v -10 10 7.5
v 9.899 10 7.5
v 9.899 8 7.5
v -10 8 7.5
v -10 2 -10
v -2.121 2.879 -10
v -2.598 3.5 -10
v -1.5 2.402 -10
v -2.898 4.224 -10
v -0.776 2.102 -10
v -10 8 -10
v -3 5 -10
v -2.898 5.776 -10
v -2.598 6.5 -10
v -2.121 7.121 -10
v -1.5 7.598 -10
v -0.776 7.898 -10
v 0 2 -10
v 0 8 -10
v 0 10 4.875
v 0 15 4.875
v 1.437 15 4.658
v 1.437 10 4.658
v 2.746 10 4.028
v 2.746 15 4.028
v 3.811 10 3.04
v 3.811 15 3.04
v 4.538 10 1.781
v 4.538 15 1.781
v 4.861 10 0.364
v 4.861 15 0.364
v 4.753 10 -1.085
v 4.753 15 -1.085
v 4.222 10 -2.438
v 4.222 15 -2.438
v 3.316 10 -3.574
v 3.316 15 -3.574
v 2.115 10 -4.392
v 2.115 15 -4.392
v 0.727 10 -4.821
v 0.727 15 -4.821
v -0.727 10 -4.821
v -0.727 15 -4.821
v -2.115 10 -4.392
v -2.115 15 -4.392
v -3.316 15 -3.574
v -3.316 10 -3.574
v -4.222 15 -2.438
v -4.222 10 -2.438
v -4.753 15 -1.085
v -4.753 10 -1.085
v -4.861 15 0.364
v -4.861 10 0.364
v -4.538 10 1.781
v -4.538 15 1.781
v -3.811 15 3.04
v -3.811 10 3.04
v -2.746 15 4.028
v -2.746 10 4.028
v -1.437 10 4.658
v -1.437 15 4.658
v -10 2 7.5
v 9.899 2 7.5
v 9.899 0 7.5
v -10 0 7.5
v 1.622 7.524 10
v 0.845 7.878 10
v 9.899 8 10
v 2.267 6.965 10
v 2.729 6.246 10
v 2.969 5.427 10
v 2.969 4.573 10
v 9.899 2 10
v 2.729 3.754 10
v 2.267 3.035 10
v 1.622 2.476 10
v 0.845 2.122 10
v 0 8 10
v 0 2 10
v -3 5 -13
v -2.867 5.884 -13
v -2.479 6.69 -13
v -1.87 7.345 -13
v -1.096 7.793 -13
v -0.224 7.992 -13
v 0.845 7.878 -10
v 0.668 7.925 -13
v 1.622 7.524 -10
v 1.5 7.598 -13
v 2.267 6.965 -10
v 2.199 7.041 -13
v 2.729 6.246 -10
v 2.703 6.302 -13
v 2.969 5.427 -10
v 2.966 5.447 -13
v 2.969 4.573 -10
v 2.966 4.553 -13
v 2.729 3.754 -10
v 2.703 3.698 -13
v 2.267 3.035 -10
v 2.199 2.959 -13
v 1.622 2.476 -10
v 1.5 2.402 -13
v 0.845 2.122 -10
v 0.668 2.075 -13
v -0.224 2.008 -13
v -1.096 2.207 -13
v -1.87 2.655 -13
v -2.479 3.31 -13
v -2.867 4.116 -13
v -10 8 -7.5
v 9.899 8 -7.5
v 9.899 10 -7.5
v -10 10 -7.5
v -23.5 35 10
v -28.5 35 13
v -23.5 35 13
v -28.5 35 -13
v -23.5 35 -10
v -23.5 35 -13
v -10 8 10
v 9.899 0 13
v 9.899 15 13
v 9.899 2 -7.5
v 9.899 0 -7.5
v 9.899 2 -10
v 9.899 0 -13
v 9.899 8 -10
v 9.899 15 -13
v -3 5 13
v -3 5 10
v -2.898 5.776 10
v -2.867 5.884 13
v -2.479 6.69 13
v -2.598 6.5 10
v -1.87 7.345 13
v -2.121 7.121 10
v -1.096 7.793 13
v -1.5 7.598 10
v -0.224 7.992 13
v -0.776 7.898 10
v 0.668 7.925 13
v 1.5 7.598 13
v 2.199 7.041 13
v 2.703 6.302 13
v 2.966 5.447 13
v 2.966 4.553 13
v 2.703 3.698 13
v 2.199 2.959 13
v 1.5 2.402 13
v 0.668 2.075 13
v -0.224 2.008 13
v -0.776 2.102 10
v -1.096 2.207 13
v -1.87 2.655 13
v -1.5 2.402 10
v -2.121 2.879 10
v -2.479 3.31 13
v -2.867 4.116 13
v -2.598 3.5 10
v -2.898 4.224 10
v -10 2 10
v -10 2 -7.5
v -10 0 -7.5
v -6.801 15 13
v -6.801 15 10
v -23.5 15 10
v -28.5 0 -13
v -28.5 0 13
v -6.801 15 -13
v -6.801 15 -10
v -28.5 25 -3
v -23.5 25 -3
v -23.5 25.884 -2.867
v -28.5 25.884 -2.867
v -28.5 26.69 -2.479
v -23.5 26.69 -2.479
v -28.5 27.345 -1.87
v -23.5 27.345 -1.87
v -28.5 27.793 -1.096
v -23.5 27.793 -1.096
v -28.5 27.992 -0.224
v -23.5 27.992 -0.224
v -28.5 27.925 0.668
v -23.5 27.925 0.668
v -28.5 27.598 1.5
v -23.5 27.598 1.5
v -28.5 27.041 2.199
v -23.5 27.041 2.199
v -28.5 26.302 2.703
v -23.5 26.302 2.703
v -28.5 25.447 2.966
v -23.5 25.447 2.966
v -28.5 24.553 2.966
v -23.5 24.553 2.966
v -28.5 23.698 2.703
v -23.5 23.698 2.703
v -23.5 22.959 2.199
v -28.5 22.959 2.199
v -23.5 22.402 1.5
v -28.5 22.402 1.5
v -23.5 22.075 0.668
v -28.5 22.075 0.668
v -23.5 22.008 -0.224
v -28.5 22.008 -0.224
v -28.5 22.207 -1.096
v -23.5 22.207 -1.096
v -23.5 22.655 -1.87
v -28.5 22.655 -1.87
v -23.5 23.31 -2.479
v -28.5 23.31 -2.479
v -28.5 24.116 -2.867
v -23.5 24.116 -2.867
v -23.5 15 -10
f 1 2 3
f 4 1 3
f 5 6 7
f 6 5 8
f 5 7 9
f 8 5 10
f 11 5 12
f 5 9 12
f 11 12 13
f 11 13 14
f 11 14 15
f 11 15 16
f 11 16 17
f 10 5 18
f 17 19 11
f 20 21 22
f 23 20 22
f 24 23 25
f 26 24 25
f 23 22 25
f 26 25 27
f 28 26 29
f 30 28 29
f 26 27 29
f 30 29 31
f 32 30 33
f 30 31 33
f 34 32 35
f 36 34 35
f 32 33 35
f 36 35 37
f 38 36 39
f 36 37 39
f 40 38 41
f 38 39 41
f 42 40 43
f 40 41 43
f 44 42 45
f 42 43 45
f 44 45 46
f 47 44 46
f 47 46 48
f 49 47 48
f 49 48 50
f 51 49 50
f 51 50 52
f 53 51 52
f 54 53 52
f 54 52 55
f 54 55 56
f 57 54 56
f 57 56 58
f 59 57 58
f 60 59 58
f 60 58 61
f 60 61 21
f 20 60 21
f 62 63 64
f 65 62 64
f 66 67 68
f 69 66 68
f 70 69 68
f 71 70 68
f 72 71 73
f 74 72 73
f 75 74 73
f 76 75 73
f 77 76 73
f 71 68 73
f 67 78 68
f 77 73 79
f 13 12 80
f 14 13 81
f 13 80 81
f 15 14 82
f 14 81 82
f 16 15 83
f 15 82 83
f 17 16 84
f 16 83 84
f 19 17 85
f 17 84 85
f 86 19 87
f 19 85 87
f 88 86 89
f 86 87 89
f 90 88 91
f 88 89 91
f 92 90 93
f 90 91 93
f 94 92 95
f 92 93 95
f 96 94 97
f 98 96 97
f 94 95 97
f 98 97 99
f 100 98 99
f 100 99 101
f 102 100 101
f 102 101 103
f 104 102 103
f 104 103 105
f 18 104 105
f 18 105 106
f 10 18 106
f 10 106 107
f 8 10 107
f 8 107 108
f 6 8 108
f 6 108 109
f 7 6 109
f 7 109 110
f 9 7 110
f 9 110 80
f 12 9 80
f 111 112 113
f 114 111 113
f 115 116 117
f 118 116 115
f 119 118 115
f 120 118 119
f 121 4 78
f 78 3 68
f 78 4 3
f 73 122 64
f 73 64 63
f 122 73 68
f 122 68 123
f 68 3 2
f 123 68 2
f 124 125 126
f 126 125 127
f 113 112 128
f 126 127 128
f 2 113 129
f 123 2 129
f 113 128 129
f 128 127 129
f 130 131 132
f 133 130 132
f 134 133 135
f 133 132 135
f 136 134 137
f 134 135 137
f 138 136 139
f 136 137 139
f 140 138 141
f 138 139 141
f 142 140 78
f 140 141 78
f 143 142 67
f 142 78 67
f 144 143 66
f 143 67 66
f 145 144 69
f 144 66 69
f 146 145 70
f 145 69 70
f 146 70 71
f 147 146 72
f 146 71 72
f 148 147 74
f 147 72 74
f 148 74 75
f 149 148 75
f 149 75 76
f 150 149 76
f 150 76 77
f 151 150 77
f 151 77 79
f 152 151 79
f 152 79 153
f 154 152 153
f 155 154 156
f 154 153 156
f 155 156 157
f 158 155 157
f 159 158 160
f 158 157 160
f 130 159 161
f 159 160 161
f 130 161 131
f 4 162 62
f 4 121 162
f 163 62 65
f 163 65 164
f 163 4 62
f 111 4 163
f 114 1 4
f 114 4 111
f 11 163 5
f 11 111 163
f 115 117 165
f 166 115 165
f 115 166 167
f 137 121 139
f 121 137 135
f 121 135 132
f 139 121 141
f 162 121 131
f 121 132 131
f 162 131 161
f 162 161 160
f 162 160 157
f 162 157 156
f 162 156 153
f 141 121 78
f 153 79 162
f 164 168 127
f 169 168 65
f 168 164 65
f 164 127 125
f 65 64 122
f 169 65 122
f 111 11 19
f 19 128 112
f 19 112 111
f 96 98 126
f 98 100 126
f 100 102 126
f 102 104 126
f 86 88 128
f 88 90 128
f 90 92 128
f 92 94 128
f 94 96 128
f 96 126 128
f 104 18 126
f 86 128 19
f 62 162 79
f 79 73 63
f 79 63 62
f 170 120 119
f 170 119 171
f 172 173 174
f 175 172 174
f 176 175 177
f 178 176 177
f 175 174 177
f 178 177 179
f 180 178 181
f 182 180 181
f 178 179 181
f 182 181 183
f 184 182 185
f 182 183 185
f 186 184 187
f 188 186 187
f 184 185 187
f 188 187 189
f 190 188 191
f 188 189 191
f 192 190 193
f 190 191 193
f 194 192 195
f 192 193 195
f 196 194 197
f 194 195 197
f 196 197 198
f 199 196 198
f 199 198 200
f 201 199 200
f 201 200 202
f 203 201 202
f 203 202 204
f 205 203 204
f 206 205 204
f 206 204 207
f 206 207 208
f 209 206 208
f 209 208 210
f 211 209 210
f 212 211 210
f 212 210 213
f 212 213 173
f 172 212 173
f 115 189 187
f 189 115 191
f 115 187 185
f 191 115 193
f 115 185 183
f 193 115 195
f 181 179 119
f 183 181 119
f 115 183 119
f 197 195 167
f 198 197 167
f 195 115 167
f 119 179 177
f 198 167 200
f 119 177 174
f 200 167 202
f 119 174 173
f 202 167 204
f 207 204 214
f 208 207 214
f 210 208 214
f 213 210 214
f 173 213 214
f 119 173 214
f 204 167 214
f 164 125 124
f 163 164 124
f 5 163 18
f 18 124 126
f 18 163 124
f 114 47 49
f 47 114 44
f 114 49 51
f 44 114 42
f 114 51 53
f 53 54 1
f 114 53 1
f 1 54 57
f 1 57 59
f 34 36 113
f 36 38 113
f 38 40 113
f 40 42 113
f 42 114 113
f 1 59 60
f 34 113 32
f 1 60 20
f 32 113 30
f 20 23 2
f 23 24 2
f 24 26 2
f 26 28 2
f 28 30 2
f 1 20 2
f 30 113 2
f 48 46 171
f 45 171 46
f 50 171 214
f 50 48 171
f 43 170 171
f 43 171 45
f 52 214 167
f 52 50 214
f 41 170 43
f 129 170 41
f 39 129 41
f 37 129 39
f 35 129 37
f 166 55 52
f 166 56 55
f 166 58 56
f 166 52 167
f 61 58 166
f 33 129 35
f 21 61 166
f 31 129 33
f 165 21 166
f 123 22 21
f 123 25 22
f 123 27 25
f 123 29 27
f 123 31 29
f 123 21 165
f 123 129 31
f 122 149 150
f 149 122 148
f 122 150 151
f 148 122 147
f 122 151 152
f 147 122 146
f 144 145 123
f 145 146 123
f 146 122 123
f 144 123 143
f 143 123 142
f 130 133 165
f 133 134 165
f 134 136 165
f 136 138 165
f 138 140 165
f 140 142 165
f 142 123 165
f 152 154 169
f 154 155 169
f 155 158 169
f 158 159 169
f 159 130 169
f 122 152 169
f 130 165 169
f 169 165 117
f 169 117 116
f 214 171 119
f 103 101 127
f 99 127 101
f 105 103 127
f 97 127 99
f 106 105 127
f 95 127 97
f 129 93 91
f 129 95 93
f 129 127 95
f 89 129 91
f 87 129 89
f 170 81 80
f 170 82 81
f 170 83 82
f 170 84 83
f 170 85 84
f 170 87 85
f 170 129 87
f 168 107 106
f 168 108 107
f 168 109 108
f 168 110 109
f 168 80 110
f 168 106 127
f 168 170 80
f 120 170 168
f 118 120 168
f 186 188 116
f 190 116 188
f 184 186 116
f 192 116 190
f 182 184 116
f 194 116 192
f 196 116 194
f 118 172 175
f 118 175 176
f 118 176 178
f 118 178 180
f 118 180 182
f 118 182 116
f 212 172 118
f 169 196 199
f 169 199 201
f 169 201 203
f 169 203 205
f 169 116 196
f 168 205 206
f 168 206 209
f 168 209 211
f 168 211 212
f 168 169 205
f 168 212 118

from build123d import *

# Parameters (mm, degrees)
SKETCH1_W           = 27
SKETCH1_H           = 26
BOSS_EXTRUDE1_DEPTH = 15
CUT_EXTRUDE2_DEPTH  = 23.5
SKETCH5_W           = 3.601284645
SKETCH5_H           = 15
CUT_EXTRUDE3_DEPTH  = 33.912763482
SKETCH6_R           = 3
CUT_EXTRUDE4_DEPTH  = 33.912763482
SKETCH11_R          = 4.875
CUT_EXTRUDE6_DEPTH  = 25.005207768
SKETCH13_W          = 26
SKETCH13_H          = 15
BOSS_EXTRUDE3_DEPTH = 15
SKETCH14_W          = 5
SKETCH14_H          = 26
BOSS_EXTRUDE4_DEPTH = 20
SKETCH15_R          = 3
CUT_EXTRUDE7_DEPTH  = 20
BOSS_EXTRUDE5_DEPTH = 3
BOSS_EXTRUDE6_DEPTH = 3


with BuildPart() as part:
    # Sketch1 → Boss-Extrude1 (new body)
    with BuildSketch(Plane(origin=(0, 0, 0), x_dir=(1, 0, 0), z_dir=(0, 1, 0))):
        Rectangle(SKETCH1_W, SKETCH1_H)
    extrude(amount=BOSS_EXTRUDE1_DEPTH)

    # Sketch4 → Cut-Extrude2 (cut)
    with BuildSketch(Plane(origin=(13.5, 0, 0), x_dir=(0, 0, -1), z_dir=(1, 0, 0))):
        Polygon((-10, 2), (-7.5, 2), (-7.5, 0), (7.5, 0), (7.5, 2), (10, 2), (10, 8), (7.5, 8), (7.5, 10), (-7.5, 10), (-7.5, 8), (-10, 8), align=None)
    extrude(amount=-CUT_EXTRUDE2_DEPTH, mode=Mode.SUBTRACT)

    # Sketch5 → Cut-Extrude3 (cut, through all)
    with BuildSketch(Plane(origin=(0, 0, -13), x_dir=(-1, 0, 0), z_dir=(0, 0, -1))):
        with Locations((-11.699357678, 7.5)):
            Rectangle(SKETCH5_W, SKETCH5_H)
    extrude(amount=-CUT_EXTRUDE3_DEPTH, mode=Mode.SUBTRACT)

    # Sketch6 → Cut-Extrude4 (cut, through all)
    with BuildSketch(Plane(origin=(0, 0, -13), x_dir=(-1, 0, 0), z_dir=(0, 0, -1))):
        with Locations((0, 5)):
            Circle(SKETCH6_R)
    extrude(amount=-CUT_EXTRUDE4_DEPTH, mode=Mode.SUBTRACT)

    # Sketch11 → Cut-Extrude6 (cut, through all)
    with BuildSketch(Plane(origin=(0, 15, 0), x_dir=(1, 0, 0), z_dir=(0, 1, 0))):
        with Locations(Location((0, 0, 0), (0, 0, 270))):
            Circle(SKETCH11_R)
    extrude(amount=-CUT_EXTRUDE6_DEPTH, mode=Mode.SUBTRACT)

    # Sketch13 → Boss-Extrude3 (add)
    with BuildSketch(Plane.ZY.offset(13.5)):
        with Locations((0, 7.5)):
            Rectangle(SKETCH13_W, SKETCH13_H)
    extrude(amount=BOSS_EXTRUDE3_DEPTH)

    # Sketch14 → Boss-Extrude4 (add)
    with BuildSketch(Plane(origin=(0, 15, 0), x_dir=(1, 0, 0), z_dir=(0, 1, 0))):
        with Locations((-26, 0)):
            Rectangle(SKETCH14_W, SKETCH14_H)
    extrude(amount=BOSS_EXTRUDE4_DEPTH)

    # Sketch15 → Cut-Extrude7 (cut)
    with BuildSketch(Plane(origin=(-23.5, 0, 0), x_dir=(0, 0, -1), z_dir=(1, 0, 0))):
        with Locations((0, 25)):
            Circle(SKETCH15_R)
    extrude(amount=-CUT_EXTRUDE7_DEPTH, mode=Mode.SUBTRACT)

    # Sketch16 → Boss-Extrude5 (add)
    with BuildSketch(Plane(origin=(0, 0, -13), x_dir=(-1, 0, 0), z_dir=(0, 0, -1))):
        Polygon((23.5, 35), (6.800642322, 15), (23.5, 15), align=None)
    extrude(amount=-BOSS_EXTRUDE5_DEPTH)

    # Sketch17 → Boss-Extrude6 (add)
    with BuildSketch(Plane.XY.offset(13)):
        Polygon((-23.5, 35), (-6.800642322, 15), (-23.5, 15), align=None)
    extrude(amount=-BOSS_EXTRUDE6_DEPTH)


solid = part.part
